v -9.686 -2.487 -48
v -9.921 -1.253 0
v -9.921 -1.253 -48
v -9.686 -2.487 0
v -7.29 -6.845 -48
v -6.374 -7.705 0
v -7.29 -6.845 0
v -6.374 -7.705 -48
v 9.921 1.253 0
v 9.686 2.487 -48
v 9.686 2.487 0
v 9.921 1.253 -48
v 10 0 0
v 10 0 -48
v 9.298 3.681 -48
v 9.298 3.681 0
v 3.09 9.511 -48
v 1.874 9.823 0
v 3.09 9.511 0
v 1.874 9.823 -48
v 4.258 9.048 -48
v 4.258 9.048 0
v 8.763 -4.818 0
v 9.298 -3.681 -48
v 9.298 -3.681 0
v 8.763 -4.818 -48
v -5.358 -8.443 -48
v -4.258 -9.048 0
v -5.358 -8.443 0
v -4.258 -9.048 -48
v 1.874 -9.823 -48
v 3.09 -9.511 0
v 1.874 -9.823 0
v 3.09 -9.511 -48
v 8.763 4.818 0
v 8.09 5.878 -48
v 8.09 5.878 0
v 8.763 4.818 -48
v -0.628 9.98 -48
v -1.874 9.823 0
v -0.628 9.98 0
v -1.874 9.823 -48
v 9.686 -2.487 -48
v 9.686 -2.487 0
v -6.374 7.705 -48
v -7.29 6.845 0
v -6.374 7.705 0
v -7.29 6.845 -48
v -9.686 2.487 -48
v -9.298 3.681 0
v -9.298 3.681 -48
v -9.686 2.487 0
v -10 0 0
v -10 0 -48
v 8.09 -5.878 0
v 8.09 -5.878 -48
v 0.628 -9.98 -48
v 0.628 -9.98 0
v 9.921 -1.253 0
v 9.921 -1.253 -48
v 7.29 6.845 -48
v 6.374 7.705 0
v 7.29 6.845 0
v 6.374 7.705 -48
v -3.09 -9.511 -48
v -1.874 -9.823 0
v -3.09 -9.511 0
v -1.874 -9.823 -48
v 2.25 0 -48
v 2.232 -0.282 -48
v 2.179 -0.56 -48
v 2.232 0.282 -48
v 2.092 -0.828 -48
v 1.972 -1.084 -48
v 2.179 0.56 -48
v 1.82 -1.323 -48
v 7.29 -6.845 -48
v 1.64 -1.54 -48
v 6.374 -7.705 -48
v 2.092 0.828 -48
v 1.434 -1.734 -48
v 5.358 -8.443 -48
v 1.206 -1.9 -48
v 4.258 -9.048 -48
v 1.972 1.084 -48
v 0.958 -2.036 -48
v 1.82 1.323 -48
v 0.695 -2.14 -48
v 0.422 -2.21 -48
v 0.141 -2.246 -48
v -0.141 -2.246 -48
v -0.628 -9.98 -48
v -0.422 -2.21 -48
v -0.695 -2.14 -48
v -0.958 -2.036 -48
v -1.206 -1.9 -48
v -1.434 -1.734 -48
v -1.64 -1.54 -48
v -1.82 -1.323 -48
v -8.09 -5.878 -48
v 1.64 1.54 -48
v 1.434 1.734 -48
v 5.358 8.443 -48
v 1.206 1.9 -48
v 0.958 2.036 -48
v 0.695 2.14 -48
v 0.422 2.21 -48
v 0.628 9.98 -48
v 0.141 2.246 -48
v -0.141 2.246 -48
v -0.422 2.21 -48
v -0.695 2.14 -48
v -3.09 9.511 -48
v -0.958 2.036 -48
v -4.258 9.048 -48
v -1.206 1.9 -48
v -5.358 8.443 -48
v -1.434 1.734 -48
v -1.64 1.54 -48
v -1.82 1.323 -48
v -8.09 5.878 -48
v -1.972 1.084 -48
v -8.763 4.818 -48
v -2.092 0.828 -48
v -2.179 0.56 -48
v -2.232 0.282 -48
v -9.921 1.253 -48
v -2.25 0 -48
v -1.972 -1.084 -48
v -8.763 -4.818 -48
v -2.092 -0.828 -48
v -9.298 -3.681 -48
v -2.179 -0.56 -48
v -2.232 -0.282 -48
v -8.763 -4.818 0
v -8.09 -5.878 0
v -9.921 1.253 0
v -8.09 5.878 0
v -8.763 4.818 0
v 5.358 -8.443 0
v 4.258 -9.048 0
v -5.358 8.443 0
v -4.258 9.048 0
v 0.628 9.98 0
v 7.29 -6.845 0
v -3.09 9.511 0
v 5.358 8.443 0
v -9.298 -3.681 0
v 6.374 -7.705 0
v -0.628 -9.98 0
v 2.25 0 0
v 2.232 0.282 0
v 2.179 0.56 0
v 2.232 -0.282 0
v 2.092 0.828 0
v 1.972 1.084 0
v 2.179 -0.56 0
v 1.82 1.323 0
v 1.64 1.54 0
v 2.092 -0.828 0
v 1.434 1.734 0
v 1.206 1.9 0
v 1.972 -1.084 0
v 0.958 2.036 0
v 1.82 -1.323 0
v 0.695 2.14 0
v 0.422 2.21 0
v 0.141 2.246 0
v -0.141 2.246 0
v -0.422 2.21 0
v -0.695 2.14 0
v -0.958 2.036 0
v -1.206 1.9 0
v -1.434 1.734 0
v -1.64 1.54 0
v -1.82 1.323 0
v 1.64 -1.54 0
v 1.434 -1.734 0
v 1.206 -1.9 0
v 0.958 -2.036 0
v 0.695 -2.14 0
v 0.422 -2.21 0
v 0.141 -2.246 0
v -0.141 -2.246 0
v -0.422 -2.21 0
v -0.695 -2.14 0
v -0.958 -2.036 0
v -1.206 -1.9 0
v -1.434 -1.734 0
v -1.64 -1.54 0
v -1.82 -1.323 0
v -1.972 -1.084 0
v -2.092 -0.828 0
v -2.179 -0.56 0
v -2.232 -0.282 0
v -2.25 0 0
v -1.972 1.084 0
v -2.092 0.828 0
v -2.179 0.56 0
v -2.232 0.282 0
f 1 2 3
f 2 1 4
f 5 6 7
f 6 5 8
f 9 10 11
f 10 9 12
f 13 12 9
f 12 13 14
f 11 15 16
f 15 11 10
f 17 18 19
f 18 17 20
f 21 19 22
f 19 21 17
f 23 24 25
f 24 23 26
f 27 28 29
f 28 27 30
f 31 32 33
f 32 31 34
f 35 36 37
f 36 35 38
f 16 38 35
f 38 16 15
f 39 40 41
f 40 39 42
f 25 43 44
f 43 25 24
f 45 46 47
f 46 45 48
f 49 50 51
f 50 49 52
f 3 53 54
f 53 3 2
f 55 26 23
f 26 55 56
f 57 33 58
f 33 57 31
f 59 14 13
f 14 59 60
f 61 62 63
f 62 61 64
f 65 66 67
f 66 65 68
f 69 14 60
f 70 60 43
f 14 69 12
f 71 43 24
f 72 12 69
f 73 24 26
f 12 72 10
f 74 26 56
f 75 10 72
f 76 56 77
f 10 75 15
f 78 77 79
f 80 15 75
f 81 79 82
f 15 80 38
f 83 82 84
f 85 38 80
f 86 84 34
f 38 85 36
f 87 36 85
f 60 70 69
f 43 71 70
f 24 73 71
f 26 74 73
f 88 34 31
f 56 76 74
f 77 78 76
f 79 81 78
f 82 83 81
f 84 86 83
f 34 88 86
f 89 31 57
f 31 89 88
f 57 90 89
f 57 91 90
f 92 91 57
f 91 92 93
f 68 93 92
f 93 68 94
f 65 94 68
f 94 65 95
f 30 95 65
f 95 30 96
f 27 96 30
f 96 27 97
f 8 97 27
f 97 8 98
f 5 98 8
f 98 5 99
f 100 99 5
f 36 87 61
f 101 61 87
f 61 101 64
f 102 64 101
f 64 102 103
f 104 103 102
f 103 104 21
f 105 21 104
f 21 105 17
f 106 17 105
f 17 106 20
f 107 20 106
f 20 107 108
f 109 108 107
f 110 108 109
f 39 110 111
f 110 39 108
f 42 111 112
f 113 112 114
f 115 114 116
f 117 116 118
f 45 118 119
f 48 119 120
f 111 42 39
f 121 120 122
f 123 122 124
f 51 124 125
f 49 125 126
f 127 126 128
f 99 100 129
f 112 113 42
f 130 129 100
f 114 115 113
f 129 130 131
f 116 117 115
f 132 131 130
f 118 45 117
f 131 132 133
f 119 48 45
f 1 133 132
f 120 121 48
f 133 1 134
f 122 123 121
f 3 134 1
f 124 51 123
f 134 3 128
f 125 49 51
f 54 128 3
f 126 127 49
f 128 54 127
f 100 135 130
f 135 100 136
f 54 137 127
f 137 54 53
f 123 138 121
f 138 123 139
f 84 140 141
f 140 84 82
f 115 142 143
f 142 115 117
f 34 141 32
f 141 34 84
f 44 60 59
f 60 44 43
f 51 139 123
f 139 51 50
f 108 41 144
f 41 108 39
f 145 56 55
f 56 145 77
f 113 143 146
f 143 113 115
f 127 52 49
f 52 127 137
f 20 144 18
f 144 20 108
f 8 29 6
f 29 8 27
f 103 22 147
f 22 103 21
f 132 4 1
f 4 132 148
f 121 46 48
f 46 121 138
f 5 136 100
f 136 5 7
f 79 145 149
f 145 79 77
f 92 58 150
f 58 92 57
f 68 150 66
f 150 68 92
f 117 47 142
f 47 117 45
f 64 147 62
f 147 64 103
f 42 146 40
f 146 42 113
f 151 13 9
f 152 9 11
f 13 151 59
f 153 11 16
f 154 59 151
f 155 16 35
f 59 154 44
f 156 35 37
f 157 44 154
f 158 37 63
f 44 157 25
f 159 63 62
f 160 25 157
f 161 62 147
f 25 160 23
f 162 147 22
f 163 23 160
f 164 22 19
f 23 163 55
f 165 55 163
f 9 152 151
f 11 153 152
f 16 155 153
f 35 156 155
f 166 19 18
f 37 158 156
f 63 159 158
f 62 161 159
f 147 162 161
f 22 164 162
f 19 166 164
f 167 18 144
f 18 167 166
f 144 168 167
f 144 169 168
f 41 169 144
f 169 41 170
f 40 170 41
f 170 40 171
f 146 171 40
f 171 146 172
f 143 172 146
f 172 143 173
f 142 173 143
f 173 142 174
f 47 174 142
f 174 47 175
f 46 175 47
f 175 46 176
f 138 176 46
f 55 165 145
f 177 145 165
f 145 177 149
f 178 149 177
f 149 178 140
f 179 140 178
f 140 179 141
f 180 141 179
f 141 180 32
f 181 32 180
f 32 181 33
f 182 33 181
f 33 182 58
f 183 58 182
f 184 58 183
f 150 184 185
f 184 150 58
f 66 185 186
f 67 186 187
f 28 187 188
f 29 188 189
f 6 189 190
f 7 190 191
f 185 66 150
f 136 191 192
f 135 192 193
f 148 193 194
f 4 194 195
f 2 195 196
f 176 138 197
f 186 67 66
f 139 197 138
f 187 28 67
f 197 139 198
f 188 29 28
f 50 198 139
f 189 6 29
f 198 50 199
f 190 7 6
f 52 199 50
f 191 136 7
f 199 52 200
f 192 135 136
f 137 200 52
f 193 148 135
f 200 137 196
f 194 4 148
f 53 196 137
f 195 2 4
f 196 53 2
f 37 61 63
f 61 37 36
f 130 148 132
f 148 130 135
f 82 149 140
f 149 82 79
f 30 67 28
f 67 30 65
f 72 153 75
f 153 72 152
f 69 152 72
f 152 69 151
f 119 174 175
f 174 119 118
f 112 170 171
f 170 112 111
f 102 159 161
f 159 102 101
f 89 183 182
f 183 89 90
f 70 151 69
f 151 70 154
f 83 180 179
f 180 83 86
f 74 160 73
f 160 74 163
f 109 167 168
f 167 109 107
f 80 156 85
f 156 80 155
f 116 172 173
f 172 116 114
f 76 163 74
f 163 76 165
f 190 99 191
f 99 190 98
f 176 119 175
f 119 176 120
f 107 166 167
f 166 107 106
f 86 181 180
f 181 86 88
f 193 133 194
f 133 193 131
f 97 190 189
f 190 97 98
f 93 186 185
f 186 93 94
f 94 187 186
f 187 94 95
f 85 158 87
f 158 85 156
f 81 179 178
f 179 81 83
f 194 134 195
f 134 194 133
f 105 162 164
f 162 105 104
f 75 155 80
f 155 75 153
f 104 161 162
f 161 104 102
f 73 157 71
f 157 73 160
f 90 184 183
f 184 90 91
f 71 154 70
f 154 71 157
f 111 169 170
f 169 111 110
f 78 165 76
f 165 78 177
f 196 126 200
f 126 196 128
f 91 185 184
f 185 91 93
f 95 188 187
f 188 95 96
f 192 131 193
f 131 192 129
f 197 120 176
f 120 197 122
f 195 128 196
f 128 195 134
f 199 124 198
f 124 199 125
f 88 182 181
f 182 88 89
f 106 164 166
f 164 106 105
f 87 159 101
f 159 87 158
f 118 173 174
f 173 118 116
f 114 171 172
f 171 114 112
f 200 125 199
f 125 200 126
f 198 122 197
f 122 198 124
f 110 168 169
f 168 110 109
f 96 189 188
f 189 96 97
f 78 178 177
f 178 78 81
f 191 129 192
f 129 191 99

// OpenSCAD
$fn = 50;


difference() {
	union() {
		translate(v = [0, 0, -48.0000000000]) {
			cylinder(h = 48, r = 10.0000000000);
		}
		cylinder(h = 0, r = 13.0000000000);
	}
	union() {
		#translate(v = [0, 0, -48]) {
			cylinder(h = 48, r = 2.2500000000);
		}
	}
}
